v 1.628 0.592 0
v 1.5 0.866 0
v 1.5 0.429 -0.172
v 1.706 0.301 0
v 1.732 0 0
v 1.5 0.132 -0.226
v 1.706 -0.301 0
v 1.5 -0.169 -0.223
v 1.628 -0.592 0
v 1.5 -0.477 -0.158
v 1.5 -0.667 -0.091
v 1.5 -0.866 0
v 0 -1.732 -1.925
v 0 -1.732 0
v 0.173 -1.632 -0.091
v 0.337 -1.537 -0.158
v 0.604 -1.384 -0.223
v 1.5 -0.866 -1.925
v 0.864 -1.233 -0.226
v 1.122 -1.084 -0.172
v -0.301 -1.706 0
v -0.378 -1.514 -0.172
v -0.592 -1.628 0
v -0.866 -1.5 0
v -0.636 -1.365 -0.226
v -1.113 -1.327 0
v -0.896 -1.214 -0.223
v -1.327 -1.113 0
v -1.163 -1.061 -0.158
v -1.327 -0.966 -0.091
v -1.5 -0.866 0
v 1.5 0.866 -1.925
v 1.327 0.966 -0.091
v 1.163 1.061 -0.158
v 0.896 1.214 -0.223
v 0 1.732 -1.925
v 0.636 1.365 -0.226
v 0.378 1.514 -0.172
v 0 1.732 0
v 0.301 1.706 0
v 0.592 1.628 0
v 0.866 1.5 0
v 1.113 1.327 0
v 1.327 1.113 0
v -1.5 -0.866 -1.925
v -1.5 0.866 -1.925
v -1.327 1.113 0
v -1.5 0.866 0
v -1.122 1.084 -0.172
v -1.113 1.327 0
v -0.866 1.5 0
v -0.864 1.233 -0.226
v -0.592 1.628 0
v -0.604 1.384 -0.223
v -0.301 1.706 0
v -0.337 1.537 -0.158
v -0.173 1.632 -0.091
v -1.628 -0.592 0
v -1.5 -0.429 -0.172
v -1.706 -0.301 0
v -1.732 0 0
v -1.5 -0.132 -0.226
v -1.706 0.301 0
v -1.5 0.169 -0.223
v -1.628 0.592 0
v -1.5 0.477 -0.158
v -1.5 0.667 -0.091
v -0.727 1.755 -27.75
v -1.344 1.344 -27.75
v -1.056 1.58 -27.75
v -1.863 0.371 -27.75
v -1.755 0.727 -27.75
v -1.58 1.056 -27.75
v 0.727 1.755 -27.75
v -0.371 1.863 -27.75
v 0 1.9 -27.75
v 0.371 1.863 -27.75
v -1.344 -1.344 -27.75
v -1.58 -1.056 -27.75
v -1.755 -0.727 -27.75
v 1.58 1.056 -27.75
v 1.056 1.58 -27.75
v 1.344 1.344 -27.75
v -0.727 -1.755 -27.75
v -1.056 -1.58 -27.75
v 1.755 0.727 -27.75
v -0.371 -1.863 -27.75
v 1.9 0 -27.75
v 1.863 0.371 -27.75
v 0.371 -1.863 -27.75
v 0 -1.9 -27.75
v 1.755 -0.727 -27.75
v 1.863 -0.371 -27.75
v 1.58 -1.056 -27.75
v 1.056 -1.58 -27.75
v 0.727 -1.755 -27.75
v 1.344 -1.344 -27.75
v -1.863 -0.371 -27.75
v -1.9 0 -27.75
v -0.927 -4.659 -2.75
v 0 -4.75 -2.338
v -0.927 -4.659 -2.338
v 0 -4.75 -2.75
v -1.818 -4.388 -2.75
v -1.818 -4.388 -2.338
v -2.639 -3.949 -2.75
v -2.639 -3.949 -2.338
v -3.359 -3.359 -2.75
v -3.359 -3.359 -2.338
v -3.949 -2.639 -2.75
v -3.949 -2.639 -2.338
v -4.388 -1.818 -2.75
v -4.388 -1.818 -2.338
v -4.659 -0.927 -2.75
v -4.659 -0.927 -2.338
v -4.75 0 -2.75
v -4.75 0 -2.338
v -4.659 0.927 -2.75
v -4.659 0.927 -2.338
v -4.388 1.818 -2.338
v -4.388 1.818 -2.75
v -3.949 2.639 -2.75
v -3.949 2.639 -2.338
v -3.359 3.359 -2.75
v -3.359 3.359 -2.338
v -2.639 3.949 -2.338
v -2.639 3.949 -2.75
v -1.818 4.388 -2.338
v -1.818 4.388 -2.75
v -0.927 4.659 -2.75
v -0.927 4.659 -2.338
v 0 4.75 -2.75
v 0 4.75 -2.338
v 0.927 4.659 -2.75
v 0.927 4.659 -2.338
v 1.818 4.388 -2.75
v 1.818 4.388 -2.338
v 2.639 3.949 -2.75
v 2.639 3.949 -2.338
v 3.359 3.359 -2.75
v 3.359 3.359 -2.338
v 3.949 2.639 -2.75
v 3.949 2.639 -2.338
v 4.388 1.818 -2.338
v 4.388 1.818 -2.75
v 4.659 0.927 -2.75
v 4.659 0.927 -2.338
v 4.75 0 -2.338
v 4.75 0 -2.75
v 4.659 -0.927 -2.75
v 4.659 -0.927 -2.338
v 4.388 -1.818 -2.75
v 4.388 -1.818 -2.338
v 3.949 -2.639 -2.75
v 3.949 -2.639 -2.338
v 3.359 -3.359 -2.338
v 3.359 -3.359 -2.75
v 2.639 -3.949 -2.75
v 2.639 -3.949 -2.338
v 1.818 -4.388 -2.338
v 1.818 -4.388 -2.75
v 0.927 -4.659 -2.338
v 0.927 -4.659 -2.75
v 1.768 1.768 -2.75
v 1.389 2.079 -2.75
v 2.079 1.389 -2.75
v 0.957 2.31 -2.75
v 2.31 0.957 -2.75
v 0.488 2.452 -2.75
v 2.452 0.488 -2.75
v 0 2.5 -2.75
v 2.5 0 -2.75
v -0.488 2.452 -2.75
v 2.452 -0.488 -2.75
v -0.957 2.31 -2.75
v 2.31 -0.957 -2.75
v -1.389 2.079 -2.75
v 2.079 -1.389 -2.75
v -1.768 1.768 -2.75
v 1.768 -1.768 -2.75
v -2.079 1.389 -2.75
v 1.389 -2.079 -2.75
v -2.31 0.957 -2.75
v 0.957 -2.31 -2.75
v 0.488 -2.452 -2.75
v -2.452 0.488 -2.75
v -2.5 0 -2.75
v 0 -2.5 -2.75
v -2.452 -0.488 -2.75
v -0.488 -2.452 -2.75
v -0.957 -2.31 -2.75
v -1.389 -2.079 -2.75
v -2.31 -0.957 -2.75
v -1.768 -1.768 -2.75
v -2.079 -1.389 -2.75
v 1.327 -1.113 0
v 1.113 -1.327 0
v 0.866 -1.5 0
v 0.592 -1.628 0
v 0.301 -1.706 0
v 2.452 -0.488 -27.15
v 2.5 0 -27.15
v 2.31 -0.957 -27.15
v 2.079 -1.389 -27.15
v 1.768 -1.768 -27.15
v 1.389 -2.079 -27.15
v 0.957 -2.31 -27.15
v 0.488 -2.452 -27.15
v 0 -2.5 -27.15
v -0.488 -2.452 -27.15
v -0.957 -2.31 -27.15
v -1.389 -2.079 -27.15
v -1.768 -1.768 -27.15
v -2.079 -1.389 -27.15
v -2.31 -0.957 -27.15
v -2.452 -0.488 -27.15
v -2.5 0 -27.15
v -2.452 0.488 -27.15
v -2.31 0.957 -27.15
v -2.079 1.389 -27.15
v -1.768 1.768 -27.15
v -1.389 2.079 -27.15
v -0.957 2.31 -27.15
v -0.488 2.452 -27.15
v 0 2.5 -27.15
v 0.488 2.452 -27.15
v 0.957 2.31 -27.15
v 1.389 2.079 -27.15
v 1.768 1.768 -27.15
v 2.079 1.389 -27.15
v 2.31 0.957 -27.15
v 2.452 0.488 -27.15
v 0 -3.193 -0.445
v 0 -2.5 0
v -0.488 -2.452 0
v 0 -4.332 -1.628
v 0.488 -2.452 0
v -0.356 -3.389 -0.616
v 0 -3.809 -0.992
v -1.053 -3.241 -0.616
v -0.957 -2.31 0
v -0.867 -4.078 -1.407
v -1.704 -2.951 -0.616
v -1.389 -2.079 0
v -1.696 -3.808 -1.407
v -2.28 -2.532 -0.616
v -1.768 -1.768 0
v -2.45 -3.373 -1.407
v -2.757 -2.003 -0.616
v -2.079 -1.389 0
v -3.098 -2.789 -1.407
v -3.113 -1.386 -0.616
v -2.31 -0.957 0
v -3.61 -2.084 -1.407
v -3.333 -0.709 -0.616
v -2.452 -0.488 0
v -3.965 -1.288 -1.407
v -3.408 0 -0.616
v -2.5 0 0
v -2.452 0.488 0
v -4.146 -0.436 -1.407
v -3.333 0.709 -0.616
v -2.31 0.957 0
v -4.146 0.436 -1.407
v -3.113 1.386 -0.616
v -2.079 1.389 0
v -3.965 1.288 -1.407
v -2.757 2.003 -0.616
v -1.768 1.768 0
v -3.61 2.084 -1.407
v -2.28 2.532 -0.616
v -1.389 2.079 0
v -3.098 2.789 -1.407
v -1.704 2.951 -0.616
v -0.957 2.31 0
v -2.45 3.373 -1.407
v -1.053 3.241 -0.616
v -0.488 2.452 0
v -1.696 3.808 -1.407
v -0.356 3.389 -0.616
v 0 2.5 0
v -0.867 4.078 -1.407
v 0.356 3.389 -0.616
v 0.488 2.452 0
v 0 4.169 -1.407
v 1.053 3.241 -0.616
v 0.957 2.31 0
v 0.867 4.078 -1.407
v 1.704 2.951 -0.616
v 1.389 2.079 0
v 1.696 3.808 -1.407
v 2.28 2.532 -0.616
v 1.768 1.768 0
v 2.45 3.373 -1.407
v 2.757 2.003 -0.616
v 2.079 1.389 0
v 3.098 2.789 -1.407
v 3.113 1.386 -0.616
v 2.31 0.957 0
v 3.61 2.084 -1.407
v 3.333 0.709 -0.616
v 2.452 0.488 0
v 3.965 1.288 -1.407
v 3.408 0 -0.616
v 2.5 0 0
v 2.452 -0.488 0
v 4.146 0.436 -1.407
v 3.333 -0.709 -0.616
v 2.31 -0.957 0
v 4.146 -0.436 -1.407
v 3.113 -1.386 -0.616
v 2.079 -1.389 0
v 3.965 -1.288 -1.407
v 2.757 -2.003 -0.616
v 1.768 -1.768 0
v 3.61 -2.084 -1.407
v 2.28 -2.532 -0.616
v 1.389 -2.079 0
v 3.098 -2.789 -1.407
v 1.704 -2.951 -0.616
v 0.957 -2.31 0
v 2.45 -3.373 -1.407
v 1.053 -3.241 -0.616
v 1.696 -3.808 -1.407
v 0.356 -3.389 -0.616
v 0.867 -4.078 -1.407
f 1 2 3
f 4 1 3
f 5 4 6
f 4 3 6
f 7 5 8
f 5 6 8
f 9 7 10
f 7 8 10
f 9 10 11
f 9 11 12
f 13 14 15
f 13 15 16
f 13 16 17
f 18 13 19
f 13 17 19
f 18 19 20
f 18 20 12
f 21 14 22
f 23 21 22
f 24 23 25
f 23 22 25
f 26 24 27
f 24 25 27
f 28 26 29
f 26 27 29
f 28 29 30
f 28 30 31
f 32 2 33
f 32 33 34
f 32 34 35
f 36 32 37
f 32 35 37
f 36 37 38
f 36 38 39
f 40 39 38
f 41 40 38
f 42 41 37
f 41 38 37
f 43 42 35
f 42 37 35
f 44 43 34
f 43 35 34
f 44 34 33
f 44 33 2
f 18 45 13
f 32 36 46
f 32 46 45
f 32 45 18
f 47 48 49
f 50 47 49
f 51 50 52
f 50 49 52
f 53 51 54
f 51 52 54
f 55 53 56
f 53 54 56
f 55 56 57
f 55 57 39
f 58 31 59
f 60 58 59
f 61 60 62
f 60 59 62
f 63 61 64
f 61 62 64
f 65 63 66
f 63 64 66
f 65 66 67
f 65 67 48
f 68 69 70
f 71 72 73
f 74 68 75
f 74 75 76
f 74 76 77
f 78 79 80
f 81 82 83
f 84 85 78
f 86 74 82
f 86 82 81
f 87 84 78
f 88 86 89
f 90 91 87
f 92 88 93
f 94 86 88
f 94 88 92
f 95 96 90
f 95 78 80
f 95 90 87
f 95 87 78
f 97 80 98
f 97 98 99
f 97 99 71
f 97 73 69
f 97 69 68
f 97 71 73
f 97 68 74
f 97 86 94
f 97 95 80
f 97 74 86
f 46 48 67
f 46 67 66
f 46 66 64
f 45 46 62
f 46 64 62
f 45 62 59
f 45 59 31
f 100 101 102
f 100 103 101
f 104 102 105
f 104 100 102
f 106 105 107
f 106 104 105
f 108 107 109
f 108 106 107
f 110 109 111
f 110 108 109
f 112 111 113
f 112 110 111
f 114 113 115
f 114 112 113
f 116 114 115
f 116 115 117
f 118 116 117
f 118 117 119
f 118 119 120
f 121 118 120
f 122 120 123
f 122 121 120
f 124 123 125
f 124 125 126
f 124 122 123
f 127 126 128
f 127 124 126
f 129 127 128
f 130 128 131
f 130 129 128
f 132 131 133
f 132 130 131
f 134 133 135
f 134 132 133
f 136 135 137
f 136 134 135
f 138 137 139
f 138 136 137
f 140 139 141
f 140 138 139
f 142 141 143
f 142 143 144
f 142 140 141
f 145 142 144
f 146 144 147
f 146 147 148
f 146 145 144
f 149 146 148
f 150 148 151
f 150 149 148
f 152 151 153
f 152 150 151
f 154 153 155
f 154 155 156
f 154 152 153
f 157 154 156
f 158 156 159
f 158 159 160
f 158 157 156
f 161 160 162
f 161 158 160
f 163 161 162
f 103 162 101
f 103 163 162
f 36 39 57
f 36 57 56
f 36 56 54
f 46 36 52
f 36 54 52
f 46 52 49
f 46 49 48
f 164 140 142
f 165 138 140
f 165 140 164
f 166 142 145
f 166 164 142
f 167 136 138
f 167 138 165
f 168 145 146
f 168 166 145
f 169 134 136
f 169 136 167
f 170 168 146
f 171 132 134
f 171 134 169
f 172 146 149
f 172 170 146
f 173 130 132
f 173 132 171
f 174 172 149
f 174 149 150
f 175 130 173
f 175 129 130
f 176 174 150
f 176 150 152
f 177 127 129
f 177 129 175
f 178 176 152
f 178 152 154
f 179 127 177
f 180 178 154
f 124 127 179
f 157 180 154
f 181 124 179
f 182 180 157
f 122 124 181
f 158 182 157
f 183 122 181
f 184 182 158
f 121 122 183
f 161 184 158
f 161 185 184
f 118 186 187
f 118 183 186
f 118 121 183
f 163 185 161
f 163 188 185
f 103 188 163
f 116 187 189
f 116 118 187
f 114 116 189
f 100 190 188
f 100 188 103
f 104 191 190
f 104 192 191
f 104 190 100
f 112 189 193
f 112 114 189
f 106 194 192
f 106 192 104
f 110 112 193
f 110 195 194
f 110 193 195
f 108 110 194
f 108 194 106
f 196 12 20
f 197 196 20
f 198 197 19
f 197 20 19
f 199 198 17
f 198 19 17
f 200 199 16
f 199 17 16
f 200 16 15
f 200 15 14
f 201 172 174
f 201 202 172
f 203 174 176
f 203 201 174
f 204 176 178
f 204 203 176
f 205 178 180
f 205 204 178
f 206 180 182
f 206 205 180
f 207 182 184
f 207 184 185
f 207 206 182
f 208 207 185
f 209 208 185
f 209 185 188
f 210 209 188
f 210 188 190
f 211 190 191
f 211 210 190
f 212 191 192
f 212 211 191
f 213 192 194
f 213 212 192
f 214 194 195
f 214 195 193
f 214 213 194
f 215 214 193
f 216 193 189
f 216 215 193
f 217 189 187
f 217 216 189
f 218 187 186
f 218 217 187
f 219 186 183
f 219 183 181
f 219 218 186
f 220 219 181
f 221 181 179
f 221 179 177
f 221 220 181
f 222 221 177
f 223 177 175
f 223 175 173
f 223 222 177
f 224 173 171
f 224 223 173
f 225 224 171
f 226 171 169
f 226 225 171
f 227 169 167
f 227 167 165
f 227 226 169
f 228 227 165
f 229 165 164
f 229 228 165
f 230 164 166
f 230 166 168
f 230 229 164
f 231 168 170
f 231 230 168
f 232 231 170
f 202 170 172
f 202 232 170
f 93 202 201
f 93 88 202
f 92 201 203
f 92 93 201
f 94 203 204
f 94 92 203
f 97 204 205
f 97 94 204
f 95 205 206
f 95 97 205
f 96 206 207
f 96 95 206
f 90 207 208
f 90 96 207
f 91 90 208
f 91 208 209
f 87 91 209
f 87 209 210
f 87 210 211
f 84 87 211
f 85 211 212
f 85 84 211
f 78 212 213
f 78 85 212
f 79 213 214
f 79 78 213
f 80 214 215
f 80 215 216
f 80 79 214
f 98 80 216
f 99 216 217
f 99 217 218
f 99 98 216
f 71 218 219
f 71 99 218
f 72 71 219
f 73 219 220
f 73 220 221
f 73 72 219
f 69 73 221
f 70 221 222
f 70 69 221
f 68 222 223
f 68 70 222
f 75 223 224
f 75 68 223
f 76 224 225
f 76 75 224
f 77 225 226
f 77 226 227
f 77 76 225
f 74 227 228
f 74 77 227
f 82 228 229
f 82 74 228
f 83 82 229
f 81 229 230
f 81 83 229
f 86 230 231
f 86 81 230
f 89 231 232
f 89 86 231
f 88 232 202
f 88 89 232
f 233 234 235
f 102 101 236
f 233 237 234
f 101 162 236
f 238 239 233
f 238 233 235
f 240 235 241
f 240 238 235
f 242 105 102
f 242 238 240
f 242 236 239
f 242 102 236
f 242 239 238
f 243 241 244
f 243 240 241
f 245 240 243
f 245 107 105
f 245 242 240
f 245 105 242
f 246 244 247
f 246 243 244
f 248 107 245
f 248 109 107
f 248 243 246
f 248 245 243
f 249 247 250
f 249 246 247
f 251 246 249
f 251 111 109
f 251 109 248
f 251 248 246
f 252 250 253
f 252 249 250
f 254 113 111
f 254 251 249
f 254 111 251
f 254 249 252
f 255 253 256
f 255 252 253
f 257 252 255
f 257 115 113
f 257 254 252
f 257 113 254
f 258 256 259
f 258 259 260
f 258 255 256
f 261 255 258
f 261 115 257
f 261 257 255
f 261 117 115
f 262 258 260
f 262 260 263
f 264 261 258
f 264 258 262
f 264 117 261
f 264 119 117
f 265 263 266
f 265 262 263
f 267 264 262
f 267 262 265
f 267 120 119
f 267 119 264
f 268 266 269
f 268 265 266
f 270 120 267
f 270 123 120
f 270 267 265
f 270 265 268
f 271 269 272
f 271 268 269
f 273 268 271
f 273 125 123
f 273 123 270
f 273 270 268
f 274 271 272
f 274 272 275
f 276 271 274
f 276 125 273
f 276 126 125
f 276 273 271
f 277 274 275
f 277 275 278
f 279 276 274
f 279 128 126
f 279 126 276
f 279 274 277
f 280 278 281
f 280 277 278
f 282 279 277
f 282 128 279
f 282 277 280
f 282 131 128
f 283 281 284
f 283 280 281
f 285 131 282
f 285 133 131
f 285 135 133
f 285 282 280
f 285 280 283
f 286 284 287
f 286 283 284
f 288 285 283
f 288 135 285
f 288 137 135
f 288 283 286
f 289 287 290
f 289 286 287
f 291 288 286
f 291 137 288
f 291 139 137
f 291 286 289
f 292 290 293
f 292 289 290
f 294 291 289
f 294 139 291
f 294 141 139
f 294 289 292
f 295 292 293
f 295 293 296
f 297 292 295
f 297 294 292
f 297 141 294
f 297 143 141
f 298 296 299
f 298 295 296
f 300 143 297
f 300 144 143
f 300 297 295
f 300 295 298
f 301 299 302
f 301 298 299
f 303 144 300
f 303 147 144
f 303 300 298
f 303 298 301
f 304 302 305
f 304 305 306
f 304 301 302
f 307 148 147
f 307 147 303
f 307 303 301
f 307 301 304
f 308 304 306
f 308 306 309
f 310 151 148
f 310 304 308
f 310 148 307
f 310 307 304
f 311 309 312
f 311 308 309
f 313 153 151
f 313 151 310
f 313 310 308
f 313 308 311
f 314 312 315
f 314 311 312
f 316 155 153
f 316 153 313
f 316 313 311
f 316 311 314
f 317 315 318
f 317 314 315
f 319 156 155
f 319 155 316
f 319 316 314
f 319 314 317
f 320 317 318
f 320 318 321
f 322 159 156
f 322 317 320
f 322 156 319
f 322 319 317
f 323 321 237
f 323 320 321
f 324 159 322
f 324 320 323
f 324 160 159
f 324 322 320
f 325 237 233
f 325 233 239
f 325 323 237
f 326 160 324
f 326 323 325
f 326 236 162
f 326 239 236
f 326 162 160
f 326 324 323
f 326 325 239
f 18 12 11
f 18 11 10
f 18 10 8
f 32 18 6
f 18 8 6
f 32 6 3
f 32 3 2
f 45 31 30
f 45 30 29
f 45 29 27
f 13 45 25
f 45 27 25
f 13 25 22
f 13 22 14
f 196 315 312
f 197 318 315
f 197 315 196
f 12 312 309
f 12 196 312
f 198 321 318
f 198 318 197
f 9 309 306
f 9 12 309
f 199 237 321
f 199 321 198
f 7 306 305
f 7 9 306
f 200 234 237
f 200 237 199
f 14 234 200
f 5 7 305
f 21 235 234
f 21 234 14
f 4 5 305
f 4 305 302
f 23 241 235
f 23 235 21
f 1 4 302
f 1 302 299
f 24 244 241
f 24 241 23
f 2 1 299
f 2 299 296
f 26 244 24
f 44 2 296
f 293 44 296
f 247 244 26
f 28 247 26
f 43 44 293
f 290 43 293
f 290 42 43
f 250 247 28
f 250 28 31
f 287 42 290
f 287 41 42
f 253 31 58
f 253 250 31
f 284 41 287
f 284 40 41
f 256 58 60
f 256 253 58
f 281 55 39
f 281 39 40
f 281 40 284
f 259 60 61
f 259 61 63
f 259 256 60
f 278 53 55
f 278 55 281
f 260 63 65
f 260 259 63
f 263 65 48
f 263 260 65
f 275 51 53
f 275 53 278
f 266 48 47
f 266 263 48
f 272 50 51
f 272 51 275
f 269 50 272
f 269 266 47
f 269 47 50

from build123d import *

# Parameters (mm, degrees)
CUT_EXTRUDE2_DEPTH = 1.925


with BuildPart() as part:
    # Sketch10 → Revolve3 (revolve)
    with BuildSketch(Plane(origin=(0, 0, 0), x_dir=(0, 0, -1), z_dir=(1, 0, 0)), mode=Mode.PRIVATE) as revolve3_sk:
        Polygon((27.15, 2.5), (27.75, 1.9), (27.75, 0), (2.75, 0), (2.75, 2.5), align=None)
    revolve(revolve3_sk.sketch.rotate(Axis((0, 0, 0), (0, 0, -1)), 90), axis=Axis((0, 0, 0), (0, 0, -1)))

    # Sketch7 → Revolve2 (revolve)
    with BuildSketch(Plane(origin=(0, 0, 0), x_dir=(0, 0, -1), z_dir=(1, 0, 0)), mode=Mode.PRIVATE) as revolve2_sk:
        with BuildLine():
            Line((2.3375, 4.75), (2.75, 4.75))
            Line((2.75, 4.75), (2.75, 0))
            Line((2.75, 0), (0, 0))
            Line((0, 0), (0, 2.5))
            ThreePointArc((0, 2.5), (0.991875183, 3.808753282), (2.3375, 4.75))
        make_face()
    revolve(revolve2_sk.sketch.rotate(Axis((0, 0, 0), (0, 0, -1)), 180), axis=Axis((0, 0, 0), (0, 0, -1)))

    # Sketch5 → Cut-Extrude2 (cut)
    with BuildSketch(Plane.XY):
        Polygon((1.5, -0.866025404), (1.5, 0.866025404), (0, 1.732050808), (-1.5, 0.866025404), (-1.5, -0.866025404), (0, -1.732050808), align=None)
    extrude(amount=-CUT_EXTRUDE2_DEPTH, mode=Mode.SUBTRACT)

    # Cut-Extrude3 cone 1 section (through the dimple's axis) → Cut-Extrude3 (revolve, cut)
    with BuildSketch(Plane(origin=(0, 0, 0), x_dir=(0, -1, 0), z_dir=(1, 0, 0))):
        Polygon((0, 0), (1.732050808, 0), (0, 1.732050808), align=None)
    revolve(axis=Axis((0, 0, 0), (0, 0, -1)), mode=Mode.SUBTRACT)


with BuildPart() as body_2:
    # Split1: read off the stored shape, not the designer's step
    # Split1: the piece on the far side of the plane
    add(part.part)
    split(bisect_by=Plane.XY.offset(-2.75), keep=Keep.BOTTOM)


with BuildPart() as part_1:
    add(part.part)

    # Split1
    split(bisect_by=Plane.XY.offset(-2.75), keep=Keep.TOP)


with BuildPart() as body_2_1:
    add(body_2.part)

    # Boss-Extrude1: read off the stored shape, not the designer's step
    # Boss-Extrude1: union part
    add(part_1.part)


solid = body_2_1.part
